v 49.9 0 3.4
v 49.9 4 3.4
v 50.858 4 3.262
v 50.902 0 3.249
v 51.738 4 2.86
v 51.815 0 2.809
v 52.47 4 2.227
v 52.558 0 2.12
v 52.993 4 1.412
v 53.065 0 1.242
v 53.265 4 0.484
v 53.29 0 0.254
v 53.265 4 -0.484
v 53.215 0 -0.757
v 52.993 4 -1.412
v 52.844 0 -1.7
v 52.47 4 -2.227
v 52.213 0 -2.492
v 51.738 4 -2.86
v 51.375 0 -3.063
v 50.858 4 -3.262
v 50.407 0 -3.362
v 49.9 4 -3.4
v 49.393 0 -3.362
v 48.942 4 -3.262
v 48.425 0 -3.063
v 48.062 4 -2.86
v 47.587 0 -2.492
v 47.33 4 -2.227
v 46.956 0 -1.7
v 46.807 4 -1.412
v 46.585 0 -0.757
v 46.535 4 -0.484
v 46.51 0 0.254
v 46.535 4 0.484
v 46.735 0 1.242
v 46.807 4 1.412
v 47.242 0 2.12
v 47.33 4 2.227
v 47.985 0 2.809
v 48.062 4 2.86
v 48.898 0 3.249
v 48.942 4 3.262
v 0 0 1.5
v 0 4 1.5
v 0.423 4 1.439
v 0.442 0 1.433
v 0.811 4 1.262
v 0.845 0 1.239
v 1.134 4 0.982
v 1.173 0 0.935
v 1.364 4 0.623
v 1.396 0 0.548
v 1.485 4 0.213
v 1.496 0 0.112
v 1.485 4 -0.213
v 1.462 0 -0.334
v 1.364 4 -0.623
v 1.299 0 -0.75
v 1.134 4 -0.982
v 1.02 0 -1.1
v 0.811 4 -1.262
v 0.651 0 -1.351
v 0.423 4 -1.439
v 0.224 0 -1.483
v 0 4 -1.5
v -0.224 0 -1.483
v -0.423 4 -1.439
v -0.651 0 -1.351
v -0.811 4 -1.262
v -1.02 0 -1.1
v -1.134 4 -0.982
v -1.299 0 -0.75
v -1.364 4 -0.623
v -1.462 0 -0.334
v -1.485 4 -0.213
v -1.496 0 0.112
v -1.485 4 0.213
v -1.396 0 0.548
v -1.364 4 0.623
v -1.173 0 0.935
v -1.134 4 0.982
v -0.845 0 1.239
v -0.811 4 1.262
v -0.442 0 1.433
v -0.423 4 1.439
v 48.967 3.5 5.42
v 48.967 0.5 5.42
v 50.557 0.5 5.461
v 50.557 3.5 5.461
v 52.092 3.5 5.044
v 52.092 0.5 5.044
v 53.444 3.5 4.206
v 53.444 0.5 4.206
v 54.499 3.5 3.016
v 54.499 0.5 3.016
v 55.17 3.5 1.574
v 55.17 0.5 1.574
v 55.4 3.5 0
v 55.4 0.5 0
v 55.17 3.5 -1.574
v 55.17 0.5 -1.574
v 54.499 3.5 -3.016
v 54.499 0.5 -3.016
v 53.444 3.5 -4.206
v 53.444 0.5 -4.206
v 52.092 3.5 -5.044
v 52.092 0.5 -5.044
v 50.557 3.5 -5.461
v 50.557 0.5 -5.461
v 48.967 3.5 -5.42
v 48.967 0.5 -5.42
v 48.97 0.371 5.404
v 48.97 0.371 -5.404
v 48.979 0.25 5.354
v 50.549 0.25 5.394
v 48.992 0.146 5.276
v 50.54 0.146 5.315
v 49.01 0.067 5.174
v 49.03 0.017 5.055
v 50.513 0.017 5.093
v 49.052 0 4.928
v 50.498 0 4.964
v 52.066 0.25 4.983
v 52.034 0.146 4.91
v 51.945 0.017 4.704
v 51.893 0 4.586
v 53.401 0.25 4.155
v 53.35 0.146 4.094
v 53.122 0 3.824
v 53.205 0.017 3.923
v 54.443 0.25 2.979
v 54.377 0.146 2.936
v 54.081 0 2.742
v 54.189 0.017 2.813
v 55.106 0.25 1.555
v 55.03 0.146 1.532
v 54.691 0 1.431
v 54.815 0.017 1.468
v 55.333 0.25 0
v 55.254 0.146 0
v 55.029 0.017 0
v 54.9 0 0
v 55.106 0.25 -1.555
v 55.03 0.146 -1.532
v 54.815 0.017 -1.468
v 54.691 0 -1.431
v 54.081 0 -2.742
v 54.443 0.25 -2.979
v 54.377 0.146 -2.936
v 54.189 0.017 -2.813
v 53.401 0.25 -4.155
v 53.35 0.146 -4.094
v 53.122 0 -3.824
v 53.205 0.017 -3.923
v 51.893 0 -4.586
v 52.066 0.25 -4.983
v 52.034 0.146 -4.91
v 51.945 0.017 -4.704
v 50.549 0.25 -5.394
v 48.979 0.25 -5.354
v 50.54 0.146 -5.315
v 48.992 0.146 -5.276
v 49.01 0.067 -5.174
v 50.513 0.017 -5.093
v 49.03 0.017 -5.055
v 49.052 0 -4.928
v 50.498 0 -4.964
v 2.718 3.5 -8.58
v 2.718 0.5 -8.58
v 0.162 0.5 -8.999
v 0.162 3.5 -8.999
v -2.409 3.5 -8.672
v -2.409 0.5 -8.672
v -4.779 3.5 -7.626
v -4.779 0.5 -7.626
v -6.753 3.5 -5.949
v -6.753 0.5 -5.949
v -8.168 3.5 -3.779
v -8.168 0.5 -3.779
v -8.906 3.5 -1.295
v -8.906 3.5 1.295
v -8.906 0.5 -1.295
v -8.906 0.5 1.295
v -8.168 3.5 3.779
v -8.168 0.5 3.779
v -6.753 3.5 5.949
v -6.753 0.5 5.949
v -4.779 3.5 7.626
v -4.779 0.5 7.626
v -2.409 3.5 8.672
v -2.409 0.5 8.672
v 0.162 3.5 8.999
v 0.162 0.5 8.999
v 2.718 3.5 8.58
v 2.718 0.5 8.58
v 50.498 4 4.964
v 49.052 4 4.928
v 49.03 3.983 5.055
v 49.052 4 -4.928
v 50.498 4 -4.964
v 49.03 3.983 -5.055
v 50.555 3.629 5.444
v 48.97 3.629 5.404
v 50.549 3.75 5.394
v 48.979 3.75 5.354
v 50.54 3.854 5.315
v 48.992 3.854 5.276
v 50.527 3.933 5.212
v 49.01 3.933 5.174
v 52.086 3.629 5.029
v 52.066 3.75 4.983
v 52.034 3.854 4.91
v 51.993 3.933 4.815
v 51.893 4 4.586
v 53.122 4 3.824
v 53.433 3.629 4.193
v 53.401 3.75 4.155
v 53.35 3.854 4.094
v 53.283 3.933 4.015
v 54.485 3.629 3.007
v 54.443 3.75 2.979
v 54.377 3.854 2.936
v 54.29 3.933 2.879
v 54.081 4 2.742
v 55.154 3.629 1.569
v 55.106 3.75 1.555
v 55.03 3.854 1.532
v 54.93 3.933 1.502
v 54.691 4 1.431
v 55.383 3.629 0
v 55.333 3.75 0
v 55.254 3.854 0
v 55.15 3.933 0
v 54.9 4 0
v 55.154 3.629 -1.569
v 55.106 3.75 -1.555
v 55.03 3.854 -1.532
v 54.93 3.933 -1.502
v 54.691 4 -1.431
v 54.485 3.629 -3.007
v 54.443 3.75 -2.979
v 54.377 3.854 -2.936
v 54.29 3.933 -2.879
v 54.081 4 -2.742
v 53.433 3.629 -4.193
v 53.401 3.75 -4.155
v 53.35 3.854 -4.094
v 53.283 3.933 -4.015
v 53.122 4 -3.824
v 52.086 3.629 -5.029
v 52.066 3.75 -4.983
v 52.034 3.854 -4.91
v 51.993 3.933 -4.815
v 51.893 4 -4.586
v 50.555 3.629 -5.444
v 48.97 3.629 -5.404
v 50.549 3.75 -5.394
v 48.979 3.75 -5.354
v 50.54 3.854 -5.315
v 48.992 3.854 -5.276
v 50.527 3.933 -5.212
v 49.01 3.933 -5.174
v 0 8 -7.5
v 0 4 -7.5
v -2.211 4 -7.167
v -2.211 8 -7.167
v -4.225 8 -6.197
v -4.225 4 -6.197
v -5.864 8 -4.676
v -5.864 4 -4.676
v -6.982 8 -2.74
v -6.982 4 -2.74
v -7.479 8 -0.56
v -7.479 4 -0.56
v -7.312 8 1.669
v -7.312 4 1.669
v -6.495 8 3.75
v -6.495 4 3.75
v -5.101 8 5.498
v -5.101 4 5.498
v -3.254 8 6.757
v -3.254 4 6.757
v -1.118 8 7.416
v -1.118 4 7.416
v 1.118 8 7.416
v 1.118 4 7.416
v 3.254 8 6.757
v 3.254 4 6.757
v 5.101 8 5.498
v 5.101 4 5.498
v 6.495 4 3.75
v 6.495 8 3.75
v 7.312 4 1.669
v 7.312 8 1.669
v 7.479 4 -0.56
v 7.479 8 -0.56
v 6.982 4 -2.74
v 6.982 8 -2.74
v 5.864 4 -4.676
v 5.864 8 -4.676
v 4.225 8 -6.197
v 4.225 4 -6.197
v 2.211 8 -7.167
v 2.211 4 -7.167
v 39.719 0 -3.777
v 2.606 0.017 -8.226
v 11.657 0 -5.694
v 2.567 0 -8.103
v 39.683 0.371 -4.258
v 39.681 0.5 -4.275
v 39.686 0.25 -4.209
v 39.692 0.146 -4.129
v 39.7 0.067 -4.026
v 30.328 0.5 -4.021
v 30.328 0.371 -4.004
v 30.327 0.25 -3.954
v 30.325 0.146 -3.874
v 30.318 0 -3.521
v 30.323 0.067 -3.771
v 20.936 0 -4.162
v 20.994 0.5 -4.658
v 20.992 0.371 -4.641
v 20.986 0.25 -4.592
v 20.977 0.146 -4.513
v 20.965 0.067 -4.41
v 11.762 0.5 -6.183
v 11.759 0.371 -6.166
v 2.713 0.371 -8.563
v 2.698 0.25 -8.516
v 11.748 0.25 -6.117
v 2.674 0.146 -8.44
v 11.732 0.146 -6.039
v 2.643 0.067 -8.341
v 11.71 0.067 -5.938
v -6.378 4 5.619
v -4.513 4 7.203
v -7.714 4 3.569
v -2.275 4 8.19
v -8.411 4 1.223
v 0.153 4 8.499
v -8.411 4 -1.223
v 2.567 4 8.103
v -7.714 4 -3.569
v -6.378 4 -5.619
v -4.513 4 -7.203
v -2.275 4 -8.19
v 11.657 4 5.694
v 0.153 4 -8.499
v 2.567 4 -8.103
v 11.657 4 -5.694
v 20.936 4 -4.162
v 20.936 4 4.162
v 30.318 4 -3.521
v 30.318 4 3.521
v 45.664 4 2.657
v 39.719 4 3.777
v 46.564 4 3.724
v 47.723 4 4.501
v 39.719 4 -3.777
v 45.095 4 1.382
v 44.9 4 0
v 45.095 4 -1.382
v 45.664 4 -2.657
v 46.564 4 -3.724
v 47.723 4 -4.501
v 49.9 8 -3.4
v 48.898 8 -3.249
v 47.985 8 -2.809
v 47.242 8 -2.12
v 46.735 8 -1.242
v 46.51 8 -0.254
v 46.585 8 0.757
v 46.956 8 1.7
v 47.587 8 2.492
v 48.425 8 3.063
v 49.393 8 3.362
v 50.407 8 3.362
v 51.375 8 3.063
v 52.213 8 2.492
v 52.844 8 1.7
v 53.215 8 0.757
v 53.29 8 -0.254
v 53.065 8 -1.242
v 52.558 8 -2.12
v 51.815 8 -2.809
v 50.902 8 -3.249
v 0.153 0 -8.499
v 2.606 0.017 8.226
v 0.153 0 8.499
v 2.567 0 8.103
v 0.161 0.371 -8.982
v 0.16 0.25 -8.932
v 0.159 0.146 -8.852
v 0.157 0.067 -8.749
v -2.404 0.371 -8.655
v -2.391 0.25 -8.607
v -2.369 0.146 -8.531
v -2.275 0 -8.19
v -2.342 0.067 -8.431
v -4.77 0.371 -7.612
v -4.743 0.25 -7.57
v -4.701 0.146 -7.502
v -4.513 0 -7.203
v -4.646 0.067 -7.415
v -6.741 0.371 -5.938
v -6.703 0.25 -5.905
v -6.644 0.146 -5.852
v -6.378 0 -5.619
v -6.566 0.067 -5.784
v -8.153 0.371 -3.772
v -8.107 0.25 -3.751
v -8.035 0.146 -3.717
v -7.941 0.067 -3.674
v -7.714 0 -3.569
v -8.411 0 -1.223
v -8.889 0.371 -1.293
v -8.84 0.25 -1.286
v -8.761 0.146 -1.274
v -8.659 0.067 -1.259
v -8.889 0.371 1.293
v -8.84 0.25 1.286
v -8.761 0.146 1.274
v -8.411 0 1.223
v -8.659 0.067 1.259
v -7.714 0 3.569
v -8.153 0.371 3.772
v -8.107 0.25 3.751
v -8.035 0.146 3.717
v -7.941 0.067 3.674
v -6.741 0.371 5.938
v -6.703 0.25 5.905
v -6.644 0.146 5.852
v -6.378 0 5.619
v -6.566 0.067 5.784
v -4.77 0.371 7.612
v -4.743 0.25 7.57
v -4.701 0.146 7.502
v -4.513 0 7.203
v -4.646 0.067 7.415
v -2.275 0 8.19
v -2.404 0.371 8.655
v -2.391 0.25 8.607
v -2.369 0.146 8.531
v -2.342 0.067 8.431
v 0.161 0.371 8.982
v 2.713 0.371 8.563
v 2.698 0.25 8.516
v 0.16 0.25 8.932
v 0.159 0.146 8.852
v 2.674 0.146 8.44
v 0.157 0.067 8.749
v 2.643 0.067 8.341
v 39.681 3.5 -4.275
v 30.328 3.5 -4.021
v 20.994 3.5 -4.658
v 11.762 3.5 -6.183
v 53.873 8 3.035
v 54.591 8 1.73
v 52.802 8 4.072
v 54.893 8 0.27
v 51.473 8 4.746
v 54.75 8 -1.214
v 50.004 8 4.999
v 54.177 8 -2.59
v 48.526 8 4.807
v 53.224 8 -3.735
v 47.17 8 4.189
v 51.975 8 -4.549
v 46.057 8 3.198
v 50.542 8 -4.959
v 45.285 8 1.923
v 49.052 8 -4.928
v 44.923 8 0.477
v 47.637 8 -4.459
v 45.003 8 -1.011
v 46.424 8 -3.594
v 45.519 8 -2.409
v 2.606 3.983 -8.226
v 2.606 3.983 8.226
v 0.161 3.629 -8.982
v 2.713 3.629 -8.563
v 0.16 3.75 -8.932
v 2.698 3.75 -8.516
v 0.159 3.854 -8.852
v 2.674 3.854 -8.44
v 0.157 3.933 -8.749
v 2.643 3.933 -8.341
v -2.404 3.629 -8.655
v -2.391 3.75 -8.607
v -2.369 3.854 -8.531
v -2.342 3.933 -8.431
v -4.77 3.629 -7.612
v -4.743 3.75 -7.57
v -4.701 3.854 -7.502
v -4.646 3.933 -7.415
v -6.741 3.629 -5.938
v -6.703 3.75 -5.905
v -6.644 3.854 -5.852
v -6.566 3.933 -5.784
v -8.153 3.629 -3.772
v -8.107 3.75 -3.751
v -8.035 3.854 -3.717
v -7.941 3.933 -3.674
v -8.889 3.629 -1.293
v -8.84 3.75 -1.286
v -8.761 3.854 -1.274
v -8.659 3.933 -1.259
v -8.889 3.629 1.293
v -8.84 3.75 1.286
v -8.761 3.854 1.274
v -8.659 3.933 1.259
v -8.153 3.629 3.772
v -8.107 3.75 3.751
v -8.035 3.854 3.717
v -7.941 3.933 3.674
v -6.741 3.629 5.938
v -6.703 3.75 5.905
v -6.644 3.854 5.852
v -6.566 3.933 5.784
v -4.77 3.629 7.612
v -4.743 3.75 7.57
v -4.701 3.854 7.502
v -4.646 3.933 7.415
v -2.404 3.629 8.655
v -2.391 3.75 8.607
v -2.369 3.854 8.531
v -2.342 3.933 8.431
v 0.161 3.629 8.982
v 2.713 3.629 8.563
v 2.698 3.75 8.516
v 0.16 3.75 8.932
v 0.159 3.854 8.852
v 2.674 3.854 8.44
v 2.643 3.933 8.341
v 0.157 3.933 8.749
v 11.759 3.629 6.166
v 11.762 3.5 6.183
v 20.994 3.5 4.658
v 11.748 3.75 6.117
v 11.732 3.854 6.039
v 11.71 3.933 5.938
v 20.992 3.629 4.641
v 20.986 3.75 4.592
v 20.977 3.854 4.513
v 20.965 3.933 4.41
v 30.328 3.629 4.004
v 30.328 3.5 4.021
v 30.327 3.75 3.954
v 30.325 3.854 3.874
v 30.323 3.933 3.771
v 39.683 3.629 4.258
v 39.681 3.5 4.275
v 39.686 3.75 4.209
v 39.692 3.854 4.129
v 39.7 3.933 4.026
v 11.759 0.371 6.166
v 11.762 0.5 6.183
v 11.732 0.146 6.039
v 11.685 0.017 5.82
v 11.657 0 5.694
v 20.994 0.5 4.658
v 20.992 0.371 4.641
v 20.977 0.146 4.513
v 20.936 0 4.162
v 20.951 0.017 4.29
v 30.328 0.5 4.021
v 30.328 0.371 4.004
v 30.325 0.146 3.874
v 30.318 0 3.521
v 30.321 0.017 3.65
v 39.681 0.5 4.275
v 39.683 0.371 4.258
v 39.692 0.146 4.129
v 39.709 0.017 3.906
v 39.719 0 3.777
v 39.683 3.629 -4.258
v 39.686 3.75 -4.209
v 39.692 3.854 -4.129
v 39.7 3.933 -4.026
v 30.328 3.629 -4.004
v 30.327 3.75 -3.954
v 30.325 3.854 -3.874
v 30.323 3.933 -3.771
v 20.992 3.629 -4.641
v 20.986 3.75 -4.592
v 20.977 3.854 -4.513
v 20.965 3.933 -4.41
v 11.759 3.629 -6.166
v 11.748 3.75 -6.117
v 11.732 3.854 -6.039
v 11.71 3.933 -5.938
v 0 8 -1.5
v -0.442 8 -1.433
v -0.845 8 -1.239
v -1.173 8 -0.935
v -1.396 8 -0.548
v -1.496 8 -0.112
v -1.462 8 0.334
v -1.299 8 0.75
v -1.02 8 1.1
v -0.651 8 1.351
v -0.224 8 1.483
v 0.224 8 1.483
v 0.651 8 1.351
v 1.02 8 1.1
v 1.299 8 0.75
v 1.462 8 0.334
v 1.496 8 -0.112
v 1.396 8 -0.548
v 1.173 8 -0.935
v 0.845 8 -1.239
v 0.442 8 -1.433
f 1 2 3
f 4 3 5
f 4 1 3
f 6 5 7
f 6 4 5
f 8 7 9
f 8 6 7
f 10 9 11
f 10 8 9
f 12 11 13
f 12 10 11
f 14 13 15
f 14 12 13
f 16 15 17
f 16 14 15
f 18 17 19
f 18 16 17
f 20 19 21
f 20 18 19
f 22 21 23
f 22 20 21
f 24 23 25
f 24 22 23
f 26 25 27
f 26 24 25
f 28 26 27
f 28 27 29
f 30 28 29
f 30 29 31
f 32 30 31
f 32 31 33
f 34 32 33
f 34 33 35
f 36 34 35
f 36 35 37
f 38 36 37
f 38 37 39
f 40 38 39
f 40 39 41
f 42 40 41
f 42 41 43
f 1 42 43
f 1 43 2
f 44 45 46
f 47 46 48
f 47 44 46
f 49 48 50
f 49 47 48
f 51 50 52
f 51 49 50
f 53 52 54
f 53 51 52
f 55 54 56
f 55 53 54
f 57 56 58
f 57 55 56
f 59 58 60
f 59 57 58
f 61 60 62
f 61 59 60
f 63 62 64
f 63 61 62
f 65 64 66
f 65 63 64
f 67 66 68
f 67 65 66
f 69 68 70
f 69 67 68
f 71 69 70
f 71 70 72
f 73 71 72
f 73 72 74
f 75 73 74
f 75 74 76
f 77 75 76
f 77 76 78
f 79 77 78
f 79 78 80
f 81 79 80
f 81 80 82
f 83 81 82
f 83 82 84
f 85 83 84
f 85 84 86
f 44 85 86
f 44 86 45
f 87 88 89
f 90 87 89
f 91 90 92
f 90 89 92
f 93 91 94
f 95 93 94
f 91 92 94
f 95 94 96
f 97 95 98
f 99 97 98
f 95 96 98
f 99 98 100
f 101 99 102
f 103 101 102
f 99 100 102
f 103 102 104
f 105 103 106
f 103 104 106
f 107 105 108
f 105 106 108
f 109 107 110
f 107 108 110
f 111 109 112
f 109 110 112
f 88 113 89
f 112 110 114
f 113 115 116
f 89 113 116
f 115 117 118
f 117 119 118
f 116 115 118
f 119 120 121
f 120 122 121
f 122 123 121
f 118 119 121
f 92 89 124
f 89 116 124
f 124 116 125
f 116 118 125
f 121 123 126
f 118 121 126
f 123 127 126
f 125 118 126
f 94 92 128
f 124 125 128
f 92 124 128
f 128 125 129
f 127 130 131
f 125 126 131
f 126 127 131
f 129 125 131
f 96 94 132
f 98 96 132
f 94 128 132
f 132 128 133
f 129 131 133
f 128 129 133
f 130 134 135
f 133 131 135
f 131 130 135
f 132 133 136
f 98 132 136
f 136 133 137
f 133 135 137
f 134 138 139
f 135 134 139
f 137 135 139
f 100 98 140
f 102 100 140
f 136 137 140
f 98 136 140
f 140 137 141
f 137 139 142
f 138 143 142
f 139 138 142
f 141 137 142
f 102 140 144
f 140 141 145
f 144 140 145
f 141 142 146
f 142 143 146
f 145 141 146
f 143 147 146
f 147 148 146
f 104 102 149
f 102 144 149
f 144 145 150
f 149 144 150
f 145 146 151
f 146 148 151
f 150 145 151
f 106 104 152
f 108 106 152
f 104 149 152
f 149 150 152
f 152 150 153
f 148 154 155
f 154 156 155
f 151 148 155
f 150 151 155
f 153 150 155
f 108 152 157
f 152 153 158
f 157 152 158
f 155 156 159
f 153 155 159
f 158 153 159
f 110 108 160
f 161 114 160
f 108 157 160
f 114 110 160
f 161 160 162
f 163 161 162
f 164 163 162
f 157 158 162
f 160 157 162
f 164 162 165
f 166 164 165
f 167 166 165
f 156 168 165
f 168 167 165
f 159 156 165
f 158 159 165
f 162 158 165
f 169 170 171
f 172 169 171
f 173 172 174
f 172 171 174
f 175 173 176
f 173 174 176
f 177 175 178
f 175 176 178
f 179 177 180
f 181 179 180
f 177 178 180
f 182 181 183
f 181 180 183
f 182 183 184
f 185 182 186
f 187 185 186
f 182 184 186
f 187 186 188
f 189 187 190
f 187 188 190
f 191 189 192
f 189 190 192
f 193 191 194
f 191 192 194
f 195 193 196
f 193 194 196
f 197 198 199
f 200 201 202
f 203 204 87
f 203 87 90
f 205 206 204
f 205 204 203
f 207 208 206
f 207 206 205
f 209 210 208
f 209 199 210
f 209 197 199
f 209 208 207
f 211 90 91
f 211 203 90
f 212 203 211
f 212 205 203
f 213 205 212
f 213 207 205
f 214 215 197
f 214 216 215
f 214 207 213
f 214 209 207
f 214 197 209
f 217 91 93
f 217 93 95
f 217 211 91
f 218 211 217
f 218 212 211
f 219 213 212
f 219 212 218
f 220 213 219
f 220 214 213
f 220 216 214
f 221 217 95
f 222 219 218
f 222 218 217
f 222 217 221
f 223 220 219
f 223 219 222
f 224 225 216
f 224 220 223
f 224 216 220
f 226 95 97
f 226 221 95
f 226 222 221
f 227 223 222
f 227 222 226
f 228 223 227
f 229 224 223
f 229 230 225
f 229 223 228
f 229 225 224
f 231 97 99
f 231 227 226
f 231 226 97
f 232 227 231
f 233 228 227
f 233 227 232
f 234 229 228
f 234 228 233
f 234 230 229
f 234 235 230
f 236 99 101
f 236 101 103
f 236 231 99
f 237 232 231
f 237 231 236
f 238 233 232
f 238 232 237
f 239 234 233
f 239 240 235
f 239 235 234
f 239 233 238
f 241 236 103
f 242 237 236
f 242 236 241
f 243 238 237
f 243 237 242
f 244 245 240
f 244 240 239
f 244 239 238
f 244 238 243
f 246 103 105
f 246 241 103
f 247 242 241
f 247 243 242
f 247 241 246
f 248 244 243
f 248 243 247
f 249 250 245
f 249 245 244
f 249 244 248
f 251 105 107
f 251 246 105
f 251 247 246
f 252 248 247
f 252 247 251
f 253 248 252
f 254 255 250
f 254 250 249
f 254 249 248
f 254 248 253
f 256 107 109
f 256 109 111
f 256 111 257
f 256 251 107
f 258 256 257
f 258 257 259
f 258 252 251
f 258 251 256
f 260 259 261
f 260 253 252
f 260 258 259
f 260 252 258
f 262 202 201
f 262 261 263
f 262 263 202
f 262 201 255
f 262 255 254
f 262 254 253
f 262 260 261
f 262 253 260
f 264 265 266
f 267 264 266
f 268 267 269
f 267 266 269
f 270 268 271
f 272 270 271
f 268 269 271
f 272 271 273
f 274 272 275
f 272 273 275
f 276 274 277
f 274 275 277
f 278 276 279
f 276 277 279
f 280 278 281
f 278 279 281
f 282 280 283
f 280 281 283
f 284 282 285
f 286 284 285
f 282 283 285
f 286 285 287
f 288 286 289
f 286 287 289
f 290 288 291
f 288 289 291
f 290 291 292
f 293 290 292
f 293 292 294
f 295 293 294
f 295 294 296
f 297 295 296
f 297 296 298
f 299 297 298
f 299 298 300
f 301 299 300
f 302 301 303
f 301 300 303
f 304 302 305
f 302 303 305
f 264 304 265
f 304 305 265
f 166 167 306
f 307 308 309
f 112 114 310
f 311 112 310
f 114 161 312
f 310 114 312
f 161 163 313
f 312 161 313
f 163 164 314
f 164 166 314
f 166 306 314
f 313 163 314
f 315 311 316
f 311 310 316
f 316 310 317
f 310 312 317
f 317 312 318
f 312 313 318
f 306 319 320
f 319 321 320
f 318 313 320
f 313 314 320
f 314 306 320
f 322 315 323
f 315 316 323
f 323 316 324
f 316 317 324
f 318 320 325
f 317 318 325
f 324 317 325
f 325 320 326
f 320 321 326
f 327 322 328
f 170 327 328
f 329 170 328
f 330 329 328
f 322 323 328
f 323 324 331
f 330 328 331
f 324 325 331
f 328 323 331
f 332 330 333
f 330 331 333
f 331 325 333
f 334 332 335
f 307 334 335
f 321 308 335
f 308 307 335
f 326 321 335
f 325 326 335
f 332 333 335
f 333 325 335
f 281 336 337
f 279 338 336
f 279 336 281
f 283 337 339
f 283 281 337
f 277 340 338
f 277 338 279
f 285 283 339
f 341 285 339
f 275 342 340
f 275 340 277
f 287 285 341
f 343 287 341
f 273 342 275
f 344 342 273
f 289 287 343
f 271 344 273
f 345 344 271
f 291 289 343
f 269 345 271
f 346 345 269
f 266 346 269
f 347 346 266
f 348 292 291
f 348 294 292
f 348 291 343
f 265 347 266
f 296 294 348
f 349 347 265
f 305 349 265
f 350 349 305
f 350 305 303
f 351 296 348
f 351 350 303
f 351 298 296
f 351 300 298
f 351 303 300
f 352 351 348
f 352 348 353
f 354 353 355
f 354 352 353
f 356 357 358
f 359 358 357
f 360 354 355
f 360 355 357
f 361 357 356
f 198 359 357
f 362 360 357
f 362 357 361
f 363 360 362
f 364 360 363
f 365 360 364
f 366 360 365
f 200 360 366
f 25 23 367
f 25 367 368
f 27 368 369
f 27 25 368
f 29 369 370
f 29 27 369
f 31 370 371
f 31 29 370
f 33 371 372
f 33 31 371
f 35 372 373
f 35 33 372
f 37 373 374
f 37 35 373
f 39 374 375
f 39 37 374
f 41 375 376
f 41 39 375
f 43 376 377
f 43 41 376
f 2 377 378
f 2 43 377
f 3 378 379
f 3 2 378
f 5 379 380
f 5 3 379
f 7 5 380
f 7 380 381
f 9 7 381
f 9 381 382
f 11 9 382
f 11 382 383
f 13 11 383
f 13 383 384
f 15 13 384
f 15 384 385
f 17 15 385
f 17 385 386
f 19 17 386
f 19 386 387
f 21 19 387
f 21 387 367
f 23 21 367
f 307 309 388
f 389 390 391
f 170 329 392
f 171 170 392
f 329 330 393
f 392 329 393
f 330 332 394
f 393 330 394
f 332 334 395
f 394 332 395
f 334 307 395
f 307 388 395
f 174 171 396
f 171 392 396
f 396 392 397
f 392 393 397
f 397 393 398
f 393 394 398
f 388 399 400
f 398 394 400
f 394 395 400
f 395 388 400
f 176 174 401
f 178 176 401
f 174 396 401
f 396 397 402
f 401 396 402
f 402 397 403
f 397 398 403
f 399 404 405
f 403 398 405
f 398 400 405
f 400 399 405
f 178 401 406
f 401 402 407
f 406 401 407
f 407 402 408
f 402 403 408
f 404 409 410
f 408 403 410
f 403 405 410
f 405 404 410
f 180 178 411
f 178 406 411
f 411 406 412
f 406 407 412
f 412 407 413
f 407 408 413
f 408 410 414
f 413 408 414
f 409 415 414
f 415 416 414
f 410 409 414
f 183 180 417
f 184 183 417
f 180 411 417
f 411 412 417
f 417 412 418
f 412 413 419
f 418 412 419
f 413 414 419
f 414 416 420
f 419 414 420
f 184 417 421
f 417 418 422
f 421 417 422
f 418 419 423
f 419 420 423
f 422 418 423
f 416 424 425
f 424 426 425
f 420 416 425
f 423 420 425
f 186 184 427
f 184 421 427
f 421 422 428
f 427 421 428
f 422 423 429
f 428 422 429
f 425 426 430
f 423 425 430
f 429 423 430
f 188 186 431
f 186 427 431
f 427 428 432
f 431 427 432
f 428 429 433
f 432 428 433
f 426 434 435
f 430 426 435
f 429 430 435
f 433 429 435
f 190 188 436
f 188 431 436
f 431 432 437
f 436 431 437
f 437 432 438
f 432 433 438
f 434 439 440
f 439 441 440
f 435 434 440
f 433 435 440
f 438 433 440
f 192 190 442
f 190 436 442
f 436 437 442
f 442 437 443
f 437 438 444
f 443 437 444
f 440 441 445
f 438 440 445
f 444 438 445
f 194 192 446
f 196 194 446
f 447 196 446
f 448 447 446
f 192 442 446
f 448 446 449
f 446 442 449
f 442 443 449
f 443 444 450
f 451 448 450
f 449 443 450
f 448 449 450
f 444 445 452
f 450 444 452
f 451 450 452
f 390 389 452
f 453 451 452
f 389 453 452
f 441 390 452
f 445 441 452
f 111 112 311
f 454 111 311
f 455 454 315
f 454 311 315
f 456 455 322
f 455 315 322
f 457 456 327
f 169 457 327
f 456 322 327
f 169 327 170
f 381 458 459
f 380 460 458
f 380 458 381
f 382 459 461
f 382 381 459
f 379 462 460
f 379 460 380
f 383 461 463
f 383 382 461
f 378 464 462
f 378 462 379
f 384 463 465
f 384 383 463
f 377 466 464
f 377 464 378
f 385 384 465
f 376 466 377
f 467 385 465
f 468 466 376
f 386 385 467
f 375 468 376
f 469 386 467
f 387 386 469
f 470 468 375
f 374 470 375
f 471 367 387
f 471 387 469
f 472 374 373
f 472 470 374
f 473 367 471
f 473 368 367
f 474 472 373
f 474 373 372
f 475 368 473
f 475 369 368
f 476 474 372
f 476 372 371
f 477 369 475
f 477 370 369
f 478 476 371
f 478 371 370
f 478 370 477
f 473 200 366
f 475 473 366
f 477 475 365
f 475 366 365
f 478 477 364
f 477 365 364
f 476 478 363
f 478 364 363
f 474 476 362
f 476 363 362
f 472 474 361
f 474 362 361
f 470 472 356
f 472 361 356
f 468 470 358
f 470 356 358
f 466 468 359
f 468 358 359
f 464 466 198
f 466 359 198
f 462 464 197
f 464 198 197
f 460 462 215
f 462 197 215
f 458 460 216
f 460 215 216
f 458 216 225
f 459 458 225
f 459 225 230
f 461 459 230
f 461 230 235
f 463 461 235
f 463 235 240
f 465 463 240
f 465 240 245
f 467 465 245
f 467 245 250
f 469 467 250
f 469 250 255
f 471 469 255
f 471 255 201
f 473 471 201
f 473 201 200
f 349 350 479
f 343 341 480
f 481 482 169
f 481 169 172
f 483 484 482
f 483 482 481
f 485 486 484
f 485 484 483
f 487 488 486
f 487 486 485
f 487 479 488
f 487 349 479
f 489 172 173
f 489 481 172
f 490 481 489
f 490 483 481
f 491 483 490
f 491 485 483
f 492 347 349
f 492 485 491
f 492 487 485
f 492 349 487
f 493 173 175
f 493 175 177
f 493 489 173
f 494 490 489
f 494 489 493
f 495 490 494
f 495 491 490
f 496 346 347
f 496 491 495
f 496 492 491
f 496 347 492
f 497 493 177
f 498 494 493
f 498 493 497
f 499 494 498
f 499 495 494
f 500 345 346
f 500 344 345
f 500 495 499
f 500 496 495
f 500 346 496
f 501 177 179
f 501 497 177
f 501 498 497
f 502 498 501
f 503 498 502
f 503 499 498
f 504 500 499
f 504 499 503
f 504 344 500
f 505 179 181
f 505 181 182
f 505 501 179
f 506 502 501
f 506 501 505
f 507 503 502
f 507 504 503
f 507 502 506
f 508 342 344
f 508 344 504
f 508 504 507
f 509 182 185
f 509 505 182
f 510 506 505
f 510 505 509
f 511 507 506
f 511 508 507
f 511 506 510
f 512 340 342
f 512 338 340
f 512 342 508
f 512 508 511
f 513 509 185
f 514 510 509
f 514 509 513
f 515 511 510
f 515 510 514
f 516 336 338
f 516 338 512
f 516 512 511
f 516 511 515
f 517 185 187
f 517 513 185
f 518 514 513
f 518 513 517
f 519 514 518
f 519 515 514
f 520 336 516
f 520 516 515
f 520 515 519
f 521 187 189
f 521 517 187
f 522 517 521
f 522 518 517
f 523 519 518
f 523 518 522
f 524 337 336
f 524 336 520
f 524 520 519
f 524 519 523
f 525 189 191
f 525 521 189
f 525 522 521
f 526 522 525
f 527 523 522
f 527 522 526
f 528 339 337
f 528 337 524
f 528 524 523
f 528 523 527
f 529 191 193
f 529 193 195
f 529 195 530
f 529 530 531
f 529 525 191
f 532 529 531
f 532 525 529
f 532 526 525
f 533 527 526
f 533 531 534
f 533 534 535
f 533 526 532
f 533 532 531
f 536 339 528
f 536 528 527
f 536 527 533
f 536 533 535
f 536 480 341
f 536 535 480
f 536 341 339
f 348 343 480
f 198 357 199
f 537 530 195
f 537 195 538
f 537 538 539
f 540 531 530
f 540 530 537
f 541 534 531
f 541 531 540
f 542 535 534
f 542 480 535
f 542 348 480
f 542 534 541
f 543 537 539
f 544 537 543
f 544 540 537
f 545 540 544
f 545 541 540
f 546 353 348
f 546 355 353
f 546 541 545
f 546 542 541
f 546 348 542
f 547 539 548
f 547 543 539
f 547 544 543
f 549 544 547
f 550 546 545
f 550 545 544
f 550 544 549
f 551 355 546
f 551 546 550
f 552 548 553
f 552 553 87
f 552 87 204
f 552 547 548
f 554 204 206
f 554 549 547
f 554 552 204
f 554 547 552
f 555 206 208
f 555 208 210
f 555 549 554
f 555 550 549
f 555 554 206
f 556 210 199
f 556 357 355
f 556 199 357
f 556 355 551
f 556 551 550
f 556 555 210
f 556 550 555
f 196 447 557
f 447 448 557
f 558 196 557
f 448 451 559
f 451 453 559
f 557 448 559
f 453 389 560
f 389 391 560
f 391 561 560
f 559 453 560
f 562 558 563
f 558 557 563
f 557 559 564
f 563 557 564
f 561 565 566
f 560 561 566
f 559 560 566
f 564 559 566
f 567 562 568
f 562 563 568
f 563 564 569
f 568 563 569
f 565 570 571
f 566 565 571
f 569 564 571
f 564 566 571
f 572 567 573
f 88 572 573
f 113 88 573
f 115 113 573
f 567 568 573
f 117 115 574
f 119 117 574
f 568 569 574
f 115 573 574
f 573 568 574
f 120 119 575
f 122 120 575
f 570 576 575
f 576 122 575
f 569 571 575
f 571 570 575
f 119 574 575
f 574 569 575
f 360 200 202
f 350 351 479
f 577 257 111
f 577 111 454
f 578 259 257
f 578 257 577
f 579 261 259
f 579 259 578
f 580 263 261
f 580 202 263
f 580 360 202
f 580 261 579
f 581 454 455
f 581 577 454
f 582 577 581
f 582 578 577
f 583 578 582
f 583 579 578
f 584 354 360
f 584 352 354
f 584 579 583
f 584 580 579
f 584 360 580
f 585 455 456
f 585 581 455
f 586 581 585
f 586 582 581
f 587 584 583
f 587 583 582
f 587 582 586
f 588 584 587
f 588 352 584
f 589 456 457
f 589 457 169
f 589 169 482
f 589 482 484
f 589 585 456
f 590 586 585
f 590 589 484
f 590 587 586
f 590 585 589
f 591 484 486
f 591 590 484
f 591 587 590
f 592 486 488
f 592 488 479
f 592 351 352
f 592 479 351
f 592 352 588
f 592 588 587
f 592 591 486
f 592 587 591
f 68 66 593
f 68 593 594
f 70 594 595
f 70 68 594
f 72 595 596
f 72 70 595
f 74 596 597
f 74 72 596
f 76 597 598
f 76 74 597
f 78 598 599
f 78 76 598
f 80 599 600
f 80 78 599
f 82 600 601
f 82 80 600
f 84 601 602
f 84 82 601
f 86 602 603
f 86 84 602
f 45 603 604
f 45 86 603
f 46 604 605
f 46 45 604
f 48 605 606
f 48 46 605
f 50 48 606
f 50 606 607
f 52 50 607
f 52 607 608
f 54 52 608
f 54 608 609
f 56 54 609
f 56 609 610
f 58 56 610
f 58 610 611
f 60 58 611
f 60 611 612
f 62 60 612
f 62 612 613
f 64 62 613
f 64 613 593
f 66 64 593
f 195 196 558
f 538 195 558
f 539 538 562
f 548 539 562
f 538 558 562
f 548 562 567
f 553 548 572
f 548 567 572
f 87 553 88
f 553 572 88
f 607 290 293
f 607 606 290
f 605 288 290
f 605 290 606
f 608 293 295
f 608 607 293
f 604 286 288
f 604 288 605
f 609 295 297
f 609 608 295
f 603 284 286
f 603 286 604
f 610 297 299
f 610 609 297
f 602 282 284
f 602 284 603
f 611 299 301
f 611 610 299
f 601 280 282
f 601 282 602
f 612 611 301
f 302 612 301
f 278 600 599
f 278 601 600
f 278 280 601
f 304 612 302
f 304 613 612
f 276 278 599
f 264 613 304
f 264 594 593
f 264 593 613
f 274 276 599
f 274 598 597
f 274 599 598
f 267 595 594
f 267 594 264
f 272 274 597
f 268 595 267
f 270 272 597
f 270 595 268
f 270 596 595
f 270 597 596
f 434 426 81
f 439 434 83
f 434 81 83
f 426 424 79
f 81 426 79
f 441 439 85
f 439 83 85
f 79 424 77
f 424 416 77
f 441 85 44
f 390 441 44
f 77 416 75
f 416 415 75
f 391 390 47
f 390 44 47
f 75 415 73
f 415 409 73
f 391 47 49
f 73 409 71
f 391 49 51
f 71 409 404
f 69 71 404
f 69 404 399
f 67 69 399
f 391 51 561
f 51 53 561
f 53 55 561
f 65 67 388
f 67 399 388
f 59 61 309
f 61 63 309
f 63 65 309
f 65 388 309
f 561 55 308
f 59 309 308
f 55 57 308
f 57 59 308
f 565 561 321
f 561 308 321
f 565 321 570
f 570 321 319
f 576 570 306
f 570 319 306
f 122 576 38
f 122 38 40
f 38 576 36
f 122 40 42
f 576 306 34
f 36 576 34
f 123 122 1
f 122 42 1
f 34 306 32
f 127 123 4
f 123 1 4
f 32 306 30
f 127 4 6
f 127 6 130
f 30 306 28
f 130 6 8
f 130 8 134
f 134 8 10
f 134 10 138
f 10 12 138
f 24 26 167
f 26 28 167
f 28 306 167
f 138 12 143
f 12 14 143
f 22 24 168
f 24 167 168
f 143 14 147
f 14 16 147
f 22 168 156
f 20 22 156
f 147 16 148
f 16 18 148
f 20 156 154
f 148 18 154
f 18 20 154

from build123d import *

# Parameters (mm, degrees)
SKETCH_1_R      = 1.5
SKETCH_1_R_2    = 3.4
EXTRUDE_1_DEPTH = 4
FILLET_1_R      = 0.5
SKETCH_2_R      = 7.5
SKETCH_2_R_2    = 1.5
SKETCH_2_R_3    = 5
SKETCH_2_R_4    = 3.4
EXTRUDE_2_DEPTH = 4


with BuildPart() as part:
    # 草图1 → 凸台-拉伸1 (new body)
    with BuildSketch(Plane(origin=(0, 0, 0), x_dir=(1, 0, 0), z_dir=(0, 1, 0))):
        with BuildLine():
            ThreePointArc((2.718196527, 8.579709065), (-9, 0), (2.718196527, -8.579709065))
            ThreePointArc((2.718196527, -8.579709065), (25.653399298, -4.228021884), (48.967323861, -5.420342722))
            ThreePointArc((48.967323861, -5.420342722), (55.4, 0), (48.967323861, 5.420342722))
            ThreePointArc((48.967323861, 5.420342722), (25.653399298, 4.228021884), (2.718196527, 8.579709065))
        make_face()
        with Locations(Location((0, 0, 0), (0, 0, 270))):
            Circle(SKETCH_1_R, mode=Mode.SUBTRACT)
        with Locations(Location((49.9, 0, 0), (0, 0, 270))):
            Circle(SKETCH_1_R_2, mode=Mode.SUBTRACT)
    extrude(amount=EXTRUDE_1_DEPTH)

    # 圆角1
    fillet_1_edges = [part.edges().sort_by_distance(p)[0] for p in [
        (25.653399298, 4, 4.228021884),
        (55.4, 4, 0),
        (25.653399298, 4, -4.228021884),
        (55.4, 0, 0),
        (25.653399298, 0, 4.228021884),
        (-9, 0, 0),
        (25.653399298, 0, -4.228021884),
        (-9, 4, 0),
    ]]
    fillet(fillet_1_edges, radius=FILLET_1_R)

    # 草图2 → 凸台-拉伸2 (add)
    # profile 1 of 2: a face of its own
    with BuildSketch(Plane(origin=(0, 4, 0), x_dir=(1, 0, 0), z_dir=(0, 1, 0))):
        with Locations(Location((0, 0, 0), (0, 0, 90))):
            Circle(SKETCH_2_R)
        with Locations(Location((0, 0, 0), (0, 0, 90))):
            Circle(SKETCH_2_R_2, mode=Mode.SUBTRACT)
    # profile 2 of 2: a face of its own
    with BuildSketch(Plane(origin=(0, 4, 0), x_dir=(1, 0, 0), z_dir=(0, 1, 0))):
        with Locations(Location((49.9, 0, 0), (0, 0, 99.763253754))):
            Circle(SKETCH_2_R_3)
        with Locations(Location((49.9, 0, 0), (0, 0, 90))):
            Circle(SKETCH_2_R_4, mode=Mode.SUBTRACT)
    extrude(amount=EXTRUDE_2_DEPTH)


solid = part.part
